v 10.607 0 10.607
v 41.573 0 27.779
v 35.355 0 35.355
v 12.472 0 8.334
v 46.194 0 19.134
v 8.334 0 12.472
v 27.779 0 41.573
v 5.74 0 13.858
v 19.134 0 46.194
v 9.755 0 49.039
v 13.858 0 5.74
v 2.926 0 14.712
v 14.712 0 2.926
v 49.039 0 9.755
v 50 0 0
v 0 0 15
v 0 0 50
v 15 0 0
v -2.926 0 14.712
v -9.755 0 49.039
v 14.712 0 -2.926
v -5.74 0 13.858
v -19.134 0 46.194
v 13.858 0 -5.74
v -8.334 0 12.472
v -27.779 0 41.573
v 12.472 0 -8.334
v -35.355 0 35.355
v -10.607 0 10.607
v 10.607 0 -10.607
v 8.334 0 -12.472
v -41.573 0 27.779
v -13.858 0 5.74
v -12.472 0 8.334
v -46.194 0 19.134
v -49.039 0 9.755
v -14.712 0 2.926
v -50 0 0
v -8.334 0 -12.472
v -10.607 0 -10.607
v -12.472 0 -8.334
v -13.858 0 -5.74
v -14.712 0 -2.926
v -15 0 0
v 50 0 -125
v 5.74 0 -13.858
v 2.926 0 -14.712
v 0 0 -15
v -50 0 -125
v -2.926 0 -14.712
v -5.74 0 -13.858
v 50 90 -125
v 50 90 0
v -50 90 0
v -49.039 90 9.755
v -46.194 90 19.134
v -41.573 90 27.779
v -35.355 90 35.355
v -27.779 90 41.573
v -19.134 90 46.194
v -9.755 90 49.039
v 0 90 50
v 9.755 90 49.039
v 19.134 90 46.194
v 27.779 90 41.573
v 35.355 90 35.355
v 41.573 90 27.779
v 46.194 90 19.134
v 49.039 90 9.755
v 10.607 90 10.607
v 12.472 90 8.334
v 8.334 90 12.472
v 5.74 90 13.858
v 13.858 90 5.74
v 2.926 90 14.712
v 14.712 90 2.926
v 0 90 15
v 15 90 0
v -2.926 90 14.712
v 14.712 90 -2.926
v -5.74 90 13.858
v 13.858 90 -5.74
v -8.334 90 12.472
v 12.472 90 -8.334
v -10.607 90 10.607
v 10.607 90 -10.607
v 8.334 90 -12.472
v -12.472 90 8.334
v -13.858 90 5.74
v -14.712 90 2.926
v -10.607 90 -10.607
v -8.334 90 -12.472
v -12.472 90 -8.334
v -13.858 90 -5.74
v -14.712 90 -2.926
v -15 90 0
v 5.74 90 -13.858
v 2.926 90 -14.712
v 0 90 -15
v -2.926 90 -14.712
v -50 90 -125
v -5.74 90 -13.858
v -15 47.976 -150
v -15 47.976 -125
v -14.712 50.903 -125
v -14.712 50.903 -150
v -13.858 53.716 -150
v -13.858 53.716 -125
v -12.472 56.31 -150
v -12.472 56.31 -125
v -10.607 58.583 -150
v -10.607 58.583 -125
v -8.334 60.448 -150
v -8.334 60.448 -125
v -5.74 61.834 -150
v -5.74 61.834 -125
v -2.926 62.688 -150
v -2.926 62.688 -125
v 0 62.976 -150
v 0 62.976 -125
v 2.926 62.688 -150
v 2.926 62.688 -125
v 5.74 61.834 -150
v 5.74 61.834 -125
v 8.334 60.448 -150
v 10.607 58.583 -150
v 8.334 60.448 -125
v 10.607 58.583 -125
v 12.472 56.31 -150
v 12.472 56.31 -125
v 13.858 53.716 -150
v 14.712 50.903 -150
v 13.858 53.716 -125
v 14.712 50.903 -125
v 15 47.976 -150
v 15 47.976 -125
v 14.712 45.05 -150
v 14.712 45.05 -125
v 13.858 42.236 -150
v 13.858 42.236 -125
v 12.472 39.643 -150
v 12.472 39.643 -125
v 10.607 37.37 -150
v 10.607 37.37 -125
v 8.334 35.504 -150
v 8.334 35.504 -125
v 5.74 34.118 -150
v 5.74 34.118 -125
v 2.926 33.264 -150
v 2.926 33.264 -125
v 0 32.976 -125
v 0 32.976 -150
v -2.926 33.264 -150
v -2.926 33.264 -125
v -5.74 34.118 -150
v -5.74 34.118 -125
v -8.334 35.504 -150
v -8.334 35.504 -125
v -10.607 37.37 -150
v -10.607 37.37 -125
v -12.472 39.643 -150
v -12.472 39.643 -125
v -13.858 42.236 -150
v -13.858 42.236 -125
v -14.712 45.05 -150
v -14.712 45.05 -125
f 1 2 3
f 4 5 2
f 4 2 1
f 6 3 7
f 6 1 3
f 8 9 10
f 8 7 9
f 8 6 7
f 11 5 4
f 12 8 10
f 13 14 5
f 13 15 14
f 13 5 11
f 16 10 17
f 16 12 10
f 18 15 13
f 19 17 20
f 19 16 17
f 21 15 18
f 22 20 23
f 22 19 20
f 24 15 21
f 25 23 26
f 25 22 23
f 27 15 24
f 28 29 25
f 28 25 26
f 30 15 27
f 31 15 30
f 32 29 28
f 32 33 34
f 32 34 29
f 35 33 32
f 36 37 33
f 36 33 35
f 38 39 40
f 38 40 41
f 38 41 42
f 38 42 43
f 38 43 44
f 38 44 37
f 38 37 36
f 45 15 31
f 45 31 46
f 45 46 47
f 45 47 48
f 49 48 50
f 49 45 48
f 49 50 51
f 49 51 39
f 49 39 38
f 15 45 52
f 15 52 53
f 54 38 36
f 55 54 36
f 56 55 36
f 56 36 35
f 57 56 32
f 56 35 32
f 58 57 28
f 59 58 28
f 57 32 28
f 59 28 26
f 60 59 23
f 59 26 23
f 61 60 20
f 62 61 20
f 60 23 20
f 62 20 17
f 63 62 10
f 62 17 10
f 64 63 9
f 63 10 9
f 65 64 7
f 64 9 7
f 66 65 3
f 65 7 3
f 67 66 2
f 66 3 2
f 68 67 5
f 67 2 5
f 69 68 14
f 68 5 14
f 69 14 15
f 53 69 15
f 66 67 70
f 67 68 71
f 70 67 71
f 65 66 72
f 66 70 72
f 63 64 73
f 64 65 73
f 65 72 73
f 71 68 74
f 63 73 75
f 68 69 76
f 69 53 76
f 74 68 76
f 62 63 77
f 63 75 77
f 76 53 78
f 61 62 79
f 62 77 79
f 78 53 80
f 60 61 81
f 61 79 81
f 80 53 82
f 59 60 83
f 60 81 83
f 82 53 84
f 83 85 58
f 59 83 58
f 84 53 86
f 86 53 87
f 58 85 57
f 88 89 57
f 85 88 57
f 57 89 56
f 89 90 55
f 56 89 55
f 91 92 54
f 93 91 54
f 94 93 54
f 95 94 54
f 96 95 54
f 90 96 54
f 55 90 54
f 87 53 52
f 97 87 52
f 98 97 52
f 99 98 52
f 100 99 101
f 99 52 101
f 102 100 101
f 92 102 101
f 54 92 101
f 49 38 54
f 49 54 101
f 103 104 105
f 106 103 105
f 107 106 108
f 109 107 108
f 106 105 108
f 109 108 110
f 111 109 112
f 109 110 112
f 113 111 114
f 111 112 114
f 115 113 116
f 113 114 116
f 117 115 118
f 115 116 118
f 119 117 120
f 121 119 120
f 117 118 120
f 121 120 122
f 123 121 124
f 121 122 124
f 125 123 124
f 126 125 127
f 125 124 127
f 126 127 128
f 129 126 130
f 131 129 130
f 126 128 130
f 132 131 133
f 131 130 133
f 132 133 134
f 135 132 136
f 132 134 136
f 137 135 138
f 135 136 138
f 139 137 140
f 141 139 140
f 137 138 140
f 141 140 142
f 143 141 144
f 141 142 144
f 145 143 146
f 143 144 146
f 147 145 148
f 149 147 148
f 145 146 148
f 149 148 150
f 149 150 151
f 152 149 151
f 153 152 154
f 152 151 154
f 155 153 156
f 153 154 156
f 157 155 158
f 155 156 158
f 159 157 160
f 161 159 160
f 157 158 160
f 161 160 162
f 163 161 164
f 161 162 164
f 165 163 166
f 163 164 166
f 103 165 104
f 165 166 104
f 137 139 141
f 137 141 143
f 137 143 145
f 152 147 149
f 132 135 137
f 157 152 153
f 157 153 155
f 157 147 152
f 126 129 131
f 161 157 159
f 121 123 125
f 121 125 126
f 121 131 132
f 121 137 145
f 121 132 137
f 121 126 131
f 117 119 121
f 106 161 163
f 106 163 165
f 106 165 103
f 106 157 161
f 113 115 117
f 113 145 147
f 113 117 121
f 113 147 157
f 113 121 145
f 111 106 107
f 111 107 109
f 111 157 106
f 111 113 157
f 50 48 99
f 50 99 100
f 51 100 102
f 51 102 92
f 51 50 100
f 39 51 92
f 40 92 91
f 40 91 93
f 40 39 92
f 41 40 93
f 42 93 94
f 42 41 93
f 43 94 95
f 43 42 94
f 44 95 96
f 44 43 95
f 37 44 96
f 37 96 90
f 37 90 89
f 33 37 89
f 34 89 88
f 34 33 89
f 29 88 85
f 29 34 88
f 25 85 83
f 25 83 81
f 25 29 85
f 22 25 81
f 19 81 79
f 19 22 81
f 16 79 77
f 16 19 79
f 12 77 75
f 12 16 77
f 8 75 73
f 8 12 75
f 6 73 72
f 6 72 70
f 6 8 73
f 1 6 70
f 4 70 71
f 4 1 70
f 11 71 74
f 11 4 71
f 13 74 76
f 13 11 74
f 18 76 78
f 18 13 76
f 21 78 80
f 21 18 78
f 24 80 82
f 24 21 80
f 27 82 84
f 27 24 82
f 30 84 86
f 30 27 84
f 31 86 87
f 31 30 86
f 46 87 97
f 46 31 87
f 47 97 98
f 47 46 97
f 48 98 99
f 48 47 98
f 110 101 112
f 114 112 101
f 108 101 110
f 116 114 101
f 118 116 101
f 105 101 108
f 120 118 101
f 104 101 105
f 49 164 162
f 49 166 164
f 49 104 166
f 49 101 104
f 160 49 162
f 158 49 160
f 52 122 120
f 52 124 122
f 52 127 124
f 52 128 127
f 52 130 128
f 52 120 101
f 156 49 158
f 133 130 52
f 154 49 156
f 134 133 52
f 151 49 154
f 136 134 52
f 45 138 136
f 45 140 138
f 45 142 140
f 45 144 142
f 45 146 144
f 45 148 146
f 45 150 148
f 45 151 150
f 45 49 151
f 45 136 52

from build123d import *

# Parameters (mm, degrees)
SKETCH2_R           = 50
SKETCH2_R_2         = 15
BOSS_EXTRUDE1_DEPTH = 90
BOSS_EXTRUDE2_START = -90
BOSS_EXTRUDE2_DEPTH = 90
SKETCH4_R           = 15
BOSS_EXTRUDE3_DEPTH = 25


with BuildPart() as part:
    # Sketch2 → Boss-Extrude1 (new body)
    with BuildSketch(Plane(origin=(0, 0, 0), x_dir=(1, 0, 0), z_dir=(0, 1, 0))):
        with Locations(Location((0, 0, 0), (0, 0, 90))):
            Circle(SKETCH2_R)
        with Locations(Location((0, 0, 0), (0, 0, 90))):
            Circle(SKETCH2_R_2, mode=Mode.SUBTRACT)
    extrude(amount=BOSS_EXTRUDE1_DEPTH)

    # Sketch3 → Boss-Extrude2 (add)
    with BuildSketch(Plane(origin=(0, 90, 0), x_dir=(1, 0, 0), z_dir=(0, 1, 0)).offset(BOSS_EXTRUDE2_START)):
        with BuildLine():
            Line((-50, 0), (-50, 125))
            Line((-50, 125), (50, 125))
            Line((50, 125), (50, 0))
            ThreePointArc((50, 0), (0, 50), (-50, 0))
        make_face()
    extrude(amount=BOSS_EXTRUDE2_DEPTH)

    # Sketch4 → Boss-Extrude3 (add)
    with BuildSketch(Plane(origin=(0, 0, -125), x_dir=(-1, 0, 0), z_dir=(0, 0, -1))):
        with Locations((0, 47.976232204)):
            Circle(SKETCH4_R)
    extrude(amount=BOSS_EXTRUDE3_DEPTH)


solid = part.part
